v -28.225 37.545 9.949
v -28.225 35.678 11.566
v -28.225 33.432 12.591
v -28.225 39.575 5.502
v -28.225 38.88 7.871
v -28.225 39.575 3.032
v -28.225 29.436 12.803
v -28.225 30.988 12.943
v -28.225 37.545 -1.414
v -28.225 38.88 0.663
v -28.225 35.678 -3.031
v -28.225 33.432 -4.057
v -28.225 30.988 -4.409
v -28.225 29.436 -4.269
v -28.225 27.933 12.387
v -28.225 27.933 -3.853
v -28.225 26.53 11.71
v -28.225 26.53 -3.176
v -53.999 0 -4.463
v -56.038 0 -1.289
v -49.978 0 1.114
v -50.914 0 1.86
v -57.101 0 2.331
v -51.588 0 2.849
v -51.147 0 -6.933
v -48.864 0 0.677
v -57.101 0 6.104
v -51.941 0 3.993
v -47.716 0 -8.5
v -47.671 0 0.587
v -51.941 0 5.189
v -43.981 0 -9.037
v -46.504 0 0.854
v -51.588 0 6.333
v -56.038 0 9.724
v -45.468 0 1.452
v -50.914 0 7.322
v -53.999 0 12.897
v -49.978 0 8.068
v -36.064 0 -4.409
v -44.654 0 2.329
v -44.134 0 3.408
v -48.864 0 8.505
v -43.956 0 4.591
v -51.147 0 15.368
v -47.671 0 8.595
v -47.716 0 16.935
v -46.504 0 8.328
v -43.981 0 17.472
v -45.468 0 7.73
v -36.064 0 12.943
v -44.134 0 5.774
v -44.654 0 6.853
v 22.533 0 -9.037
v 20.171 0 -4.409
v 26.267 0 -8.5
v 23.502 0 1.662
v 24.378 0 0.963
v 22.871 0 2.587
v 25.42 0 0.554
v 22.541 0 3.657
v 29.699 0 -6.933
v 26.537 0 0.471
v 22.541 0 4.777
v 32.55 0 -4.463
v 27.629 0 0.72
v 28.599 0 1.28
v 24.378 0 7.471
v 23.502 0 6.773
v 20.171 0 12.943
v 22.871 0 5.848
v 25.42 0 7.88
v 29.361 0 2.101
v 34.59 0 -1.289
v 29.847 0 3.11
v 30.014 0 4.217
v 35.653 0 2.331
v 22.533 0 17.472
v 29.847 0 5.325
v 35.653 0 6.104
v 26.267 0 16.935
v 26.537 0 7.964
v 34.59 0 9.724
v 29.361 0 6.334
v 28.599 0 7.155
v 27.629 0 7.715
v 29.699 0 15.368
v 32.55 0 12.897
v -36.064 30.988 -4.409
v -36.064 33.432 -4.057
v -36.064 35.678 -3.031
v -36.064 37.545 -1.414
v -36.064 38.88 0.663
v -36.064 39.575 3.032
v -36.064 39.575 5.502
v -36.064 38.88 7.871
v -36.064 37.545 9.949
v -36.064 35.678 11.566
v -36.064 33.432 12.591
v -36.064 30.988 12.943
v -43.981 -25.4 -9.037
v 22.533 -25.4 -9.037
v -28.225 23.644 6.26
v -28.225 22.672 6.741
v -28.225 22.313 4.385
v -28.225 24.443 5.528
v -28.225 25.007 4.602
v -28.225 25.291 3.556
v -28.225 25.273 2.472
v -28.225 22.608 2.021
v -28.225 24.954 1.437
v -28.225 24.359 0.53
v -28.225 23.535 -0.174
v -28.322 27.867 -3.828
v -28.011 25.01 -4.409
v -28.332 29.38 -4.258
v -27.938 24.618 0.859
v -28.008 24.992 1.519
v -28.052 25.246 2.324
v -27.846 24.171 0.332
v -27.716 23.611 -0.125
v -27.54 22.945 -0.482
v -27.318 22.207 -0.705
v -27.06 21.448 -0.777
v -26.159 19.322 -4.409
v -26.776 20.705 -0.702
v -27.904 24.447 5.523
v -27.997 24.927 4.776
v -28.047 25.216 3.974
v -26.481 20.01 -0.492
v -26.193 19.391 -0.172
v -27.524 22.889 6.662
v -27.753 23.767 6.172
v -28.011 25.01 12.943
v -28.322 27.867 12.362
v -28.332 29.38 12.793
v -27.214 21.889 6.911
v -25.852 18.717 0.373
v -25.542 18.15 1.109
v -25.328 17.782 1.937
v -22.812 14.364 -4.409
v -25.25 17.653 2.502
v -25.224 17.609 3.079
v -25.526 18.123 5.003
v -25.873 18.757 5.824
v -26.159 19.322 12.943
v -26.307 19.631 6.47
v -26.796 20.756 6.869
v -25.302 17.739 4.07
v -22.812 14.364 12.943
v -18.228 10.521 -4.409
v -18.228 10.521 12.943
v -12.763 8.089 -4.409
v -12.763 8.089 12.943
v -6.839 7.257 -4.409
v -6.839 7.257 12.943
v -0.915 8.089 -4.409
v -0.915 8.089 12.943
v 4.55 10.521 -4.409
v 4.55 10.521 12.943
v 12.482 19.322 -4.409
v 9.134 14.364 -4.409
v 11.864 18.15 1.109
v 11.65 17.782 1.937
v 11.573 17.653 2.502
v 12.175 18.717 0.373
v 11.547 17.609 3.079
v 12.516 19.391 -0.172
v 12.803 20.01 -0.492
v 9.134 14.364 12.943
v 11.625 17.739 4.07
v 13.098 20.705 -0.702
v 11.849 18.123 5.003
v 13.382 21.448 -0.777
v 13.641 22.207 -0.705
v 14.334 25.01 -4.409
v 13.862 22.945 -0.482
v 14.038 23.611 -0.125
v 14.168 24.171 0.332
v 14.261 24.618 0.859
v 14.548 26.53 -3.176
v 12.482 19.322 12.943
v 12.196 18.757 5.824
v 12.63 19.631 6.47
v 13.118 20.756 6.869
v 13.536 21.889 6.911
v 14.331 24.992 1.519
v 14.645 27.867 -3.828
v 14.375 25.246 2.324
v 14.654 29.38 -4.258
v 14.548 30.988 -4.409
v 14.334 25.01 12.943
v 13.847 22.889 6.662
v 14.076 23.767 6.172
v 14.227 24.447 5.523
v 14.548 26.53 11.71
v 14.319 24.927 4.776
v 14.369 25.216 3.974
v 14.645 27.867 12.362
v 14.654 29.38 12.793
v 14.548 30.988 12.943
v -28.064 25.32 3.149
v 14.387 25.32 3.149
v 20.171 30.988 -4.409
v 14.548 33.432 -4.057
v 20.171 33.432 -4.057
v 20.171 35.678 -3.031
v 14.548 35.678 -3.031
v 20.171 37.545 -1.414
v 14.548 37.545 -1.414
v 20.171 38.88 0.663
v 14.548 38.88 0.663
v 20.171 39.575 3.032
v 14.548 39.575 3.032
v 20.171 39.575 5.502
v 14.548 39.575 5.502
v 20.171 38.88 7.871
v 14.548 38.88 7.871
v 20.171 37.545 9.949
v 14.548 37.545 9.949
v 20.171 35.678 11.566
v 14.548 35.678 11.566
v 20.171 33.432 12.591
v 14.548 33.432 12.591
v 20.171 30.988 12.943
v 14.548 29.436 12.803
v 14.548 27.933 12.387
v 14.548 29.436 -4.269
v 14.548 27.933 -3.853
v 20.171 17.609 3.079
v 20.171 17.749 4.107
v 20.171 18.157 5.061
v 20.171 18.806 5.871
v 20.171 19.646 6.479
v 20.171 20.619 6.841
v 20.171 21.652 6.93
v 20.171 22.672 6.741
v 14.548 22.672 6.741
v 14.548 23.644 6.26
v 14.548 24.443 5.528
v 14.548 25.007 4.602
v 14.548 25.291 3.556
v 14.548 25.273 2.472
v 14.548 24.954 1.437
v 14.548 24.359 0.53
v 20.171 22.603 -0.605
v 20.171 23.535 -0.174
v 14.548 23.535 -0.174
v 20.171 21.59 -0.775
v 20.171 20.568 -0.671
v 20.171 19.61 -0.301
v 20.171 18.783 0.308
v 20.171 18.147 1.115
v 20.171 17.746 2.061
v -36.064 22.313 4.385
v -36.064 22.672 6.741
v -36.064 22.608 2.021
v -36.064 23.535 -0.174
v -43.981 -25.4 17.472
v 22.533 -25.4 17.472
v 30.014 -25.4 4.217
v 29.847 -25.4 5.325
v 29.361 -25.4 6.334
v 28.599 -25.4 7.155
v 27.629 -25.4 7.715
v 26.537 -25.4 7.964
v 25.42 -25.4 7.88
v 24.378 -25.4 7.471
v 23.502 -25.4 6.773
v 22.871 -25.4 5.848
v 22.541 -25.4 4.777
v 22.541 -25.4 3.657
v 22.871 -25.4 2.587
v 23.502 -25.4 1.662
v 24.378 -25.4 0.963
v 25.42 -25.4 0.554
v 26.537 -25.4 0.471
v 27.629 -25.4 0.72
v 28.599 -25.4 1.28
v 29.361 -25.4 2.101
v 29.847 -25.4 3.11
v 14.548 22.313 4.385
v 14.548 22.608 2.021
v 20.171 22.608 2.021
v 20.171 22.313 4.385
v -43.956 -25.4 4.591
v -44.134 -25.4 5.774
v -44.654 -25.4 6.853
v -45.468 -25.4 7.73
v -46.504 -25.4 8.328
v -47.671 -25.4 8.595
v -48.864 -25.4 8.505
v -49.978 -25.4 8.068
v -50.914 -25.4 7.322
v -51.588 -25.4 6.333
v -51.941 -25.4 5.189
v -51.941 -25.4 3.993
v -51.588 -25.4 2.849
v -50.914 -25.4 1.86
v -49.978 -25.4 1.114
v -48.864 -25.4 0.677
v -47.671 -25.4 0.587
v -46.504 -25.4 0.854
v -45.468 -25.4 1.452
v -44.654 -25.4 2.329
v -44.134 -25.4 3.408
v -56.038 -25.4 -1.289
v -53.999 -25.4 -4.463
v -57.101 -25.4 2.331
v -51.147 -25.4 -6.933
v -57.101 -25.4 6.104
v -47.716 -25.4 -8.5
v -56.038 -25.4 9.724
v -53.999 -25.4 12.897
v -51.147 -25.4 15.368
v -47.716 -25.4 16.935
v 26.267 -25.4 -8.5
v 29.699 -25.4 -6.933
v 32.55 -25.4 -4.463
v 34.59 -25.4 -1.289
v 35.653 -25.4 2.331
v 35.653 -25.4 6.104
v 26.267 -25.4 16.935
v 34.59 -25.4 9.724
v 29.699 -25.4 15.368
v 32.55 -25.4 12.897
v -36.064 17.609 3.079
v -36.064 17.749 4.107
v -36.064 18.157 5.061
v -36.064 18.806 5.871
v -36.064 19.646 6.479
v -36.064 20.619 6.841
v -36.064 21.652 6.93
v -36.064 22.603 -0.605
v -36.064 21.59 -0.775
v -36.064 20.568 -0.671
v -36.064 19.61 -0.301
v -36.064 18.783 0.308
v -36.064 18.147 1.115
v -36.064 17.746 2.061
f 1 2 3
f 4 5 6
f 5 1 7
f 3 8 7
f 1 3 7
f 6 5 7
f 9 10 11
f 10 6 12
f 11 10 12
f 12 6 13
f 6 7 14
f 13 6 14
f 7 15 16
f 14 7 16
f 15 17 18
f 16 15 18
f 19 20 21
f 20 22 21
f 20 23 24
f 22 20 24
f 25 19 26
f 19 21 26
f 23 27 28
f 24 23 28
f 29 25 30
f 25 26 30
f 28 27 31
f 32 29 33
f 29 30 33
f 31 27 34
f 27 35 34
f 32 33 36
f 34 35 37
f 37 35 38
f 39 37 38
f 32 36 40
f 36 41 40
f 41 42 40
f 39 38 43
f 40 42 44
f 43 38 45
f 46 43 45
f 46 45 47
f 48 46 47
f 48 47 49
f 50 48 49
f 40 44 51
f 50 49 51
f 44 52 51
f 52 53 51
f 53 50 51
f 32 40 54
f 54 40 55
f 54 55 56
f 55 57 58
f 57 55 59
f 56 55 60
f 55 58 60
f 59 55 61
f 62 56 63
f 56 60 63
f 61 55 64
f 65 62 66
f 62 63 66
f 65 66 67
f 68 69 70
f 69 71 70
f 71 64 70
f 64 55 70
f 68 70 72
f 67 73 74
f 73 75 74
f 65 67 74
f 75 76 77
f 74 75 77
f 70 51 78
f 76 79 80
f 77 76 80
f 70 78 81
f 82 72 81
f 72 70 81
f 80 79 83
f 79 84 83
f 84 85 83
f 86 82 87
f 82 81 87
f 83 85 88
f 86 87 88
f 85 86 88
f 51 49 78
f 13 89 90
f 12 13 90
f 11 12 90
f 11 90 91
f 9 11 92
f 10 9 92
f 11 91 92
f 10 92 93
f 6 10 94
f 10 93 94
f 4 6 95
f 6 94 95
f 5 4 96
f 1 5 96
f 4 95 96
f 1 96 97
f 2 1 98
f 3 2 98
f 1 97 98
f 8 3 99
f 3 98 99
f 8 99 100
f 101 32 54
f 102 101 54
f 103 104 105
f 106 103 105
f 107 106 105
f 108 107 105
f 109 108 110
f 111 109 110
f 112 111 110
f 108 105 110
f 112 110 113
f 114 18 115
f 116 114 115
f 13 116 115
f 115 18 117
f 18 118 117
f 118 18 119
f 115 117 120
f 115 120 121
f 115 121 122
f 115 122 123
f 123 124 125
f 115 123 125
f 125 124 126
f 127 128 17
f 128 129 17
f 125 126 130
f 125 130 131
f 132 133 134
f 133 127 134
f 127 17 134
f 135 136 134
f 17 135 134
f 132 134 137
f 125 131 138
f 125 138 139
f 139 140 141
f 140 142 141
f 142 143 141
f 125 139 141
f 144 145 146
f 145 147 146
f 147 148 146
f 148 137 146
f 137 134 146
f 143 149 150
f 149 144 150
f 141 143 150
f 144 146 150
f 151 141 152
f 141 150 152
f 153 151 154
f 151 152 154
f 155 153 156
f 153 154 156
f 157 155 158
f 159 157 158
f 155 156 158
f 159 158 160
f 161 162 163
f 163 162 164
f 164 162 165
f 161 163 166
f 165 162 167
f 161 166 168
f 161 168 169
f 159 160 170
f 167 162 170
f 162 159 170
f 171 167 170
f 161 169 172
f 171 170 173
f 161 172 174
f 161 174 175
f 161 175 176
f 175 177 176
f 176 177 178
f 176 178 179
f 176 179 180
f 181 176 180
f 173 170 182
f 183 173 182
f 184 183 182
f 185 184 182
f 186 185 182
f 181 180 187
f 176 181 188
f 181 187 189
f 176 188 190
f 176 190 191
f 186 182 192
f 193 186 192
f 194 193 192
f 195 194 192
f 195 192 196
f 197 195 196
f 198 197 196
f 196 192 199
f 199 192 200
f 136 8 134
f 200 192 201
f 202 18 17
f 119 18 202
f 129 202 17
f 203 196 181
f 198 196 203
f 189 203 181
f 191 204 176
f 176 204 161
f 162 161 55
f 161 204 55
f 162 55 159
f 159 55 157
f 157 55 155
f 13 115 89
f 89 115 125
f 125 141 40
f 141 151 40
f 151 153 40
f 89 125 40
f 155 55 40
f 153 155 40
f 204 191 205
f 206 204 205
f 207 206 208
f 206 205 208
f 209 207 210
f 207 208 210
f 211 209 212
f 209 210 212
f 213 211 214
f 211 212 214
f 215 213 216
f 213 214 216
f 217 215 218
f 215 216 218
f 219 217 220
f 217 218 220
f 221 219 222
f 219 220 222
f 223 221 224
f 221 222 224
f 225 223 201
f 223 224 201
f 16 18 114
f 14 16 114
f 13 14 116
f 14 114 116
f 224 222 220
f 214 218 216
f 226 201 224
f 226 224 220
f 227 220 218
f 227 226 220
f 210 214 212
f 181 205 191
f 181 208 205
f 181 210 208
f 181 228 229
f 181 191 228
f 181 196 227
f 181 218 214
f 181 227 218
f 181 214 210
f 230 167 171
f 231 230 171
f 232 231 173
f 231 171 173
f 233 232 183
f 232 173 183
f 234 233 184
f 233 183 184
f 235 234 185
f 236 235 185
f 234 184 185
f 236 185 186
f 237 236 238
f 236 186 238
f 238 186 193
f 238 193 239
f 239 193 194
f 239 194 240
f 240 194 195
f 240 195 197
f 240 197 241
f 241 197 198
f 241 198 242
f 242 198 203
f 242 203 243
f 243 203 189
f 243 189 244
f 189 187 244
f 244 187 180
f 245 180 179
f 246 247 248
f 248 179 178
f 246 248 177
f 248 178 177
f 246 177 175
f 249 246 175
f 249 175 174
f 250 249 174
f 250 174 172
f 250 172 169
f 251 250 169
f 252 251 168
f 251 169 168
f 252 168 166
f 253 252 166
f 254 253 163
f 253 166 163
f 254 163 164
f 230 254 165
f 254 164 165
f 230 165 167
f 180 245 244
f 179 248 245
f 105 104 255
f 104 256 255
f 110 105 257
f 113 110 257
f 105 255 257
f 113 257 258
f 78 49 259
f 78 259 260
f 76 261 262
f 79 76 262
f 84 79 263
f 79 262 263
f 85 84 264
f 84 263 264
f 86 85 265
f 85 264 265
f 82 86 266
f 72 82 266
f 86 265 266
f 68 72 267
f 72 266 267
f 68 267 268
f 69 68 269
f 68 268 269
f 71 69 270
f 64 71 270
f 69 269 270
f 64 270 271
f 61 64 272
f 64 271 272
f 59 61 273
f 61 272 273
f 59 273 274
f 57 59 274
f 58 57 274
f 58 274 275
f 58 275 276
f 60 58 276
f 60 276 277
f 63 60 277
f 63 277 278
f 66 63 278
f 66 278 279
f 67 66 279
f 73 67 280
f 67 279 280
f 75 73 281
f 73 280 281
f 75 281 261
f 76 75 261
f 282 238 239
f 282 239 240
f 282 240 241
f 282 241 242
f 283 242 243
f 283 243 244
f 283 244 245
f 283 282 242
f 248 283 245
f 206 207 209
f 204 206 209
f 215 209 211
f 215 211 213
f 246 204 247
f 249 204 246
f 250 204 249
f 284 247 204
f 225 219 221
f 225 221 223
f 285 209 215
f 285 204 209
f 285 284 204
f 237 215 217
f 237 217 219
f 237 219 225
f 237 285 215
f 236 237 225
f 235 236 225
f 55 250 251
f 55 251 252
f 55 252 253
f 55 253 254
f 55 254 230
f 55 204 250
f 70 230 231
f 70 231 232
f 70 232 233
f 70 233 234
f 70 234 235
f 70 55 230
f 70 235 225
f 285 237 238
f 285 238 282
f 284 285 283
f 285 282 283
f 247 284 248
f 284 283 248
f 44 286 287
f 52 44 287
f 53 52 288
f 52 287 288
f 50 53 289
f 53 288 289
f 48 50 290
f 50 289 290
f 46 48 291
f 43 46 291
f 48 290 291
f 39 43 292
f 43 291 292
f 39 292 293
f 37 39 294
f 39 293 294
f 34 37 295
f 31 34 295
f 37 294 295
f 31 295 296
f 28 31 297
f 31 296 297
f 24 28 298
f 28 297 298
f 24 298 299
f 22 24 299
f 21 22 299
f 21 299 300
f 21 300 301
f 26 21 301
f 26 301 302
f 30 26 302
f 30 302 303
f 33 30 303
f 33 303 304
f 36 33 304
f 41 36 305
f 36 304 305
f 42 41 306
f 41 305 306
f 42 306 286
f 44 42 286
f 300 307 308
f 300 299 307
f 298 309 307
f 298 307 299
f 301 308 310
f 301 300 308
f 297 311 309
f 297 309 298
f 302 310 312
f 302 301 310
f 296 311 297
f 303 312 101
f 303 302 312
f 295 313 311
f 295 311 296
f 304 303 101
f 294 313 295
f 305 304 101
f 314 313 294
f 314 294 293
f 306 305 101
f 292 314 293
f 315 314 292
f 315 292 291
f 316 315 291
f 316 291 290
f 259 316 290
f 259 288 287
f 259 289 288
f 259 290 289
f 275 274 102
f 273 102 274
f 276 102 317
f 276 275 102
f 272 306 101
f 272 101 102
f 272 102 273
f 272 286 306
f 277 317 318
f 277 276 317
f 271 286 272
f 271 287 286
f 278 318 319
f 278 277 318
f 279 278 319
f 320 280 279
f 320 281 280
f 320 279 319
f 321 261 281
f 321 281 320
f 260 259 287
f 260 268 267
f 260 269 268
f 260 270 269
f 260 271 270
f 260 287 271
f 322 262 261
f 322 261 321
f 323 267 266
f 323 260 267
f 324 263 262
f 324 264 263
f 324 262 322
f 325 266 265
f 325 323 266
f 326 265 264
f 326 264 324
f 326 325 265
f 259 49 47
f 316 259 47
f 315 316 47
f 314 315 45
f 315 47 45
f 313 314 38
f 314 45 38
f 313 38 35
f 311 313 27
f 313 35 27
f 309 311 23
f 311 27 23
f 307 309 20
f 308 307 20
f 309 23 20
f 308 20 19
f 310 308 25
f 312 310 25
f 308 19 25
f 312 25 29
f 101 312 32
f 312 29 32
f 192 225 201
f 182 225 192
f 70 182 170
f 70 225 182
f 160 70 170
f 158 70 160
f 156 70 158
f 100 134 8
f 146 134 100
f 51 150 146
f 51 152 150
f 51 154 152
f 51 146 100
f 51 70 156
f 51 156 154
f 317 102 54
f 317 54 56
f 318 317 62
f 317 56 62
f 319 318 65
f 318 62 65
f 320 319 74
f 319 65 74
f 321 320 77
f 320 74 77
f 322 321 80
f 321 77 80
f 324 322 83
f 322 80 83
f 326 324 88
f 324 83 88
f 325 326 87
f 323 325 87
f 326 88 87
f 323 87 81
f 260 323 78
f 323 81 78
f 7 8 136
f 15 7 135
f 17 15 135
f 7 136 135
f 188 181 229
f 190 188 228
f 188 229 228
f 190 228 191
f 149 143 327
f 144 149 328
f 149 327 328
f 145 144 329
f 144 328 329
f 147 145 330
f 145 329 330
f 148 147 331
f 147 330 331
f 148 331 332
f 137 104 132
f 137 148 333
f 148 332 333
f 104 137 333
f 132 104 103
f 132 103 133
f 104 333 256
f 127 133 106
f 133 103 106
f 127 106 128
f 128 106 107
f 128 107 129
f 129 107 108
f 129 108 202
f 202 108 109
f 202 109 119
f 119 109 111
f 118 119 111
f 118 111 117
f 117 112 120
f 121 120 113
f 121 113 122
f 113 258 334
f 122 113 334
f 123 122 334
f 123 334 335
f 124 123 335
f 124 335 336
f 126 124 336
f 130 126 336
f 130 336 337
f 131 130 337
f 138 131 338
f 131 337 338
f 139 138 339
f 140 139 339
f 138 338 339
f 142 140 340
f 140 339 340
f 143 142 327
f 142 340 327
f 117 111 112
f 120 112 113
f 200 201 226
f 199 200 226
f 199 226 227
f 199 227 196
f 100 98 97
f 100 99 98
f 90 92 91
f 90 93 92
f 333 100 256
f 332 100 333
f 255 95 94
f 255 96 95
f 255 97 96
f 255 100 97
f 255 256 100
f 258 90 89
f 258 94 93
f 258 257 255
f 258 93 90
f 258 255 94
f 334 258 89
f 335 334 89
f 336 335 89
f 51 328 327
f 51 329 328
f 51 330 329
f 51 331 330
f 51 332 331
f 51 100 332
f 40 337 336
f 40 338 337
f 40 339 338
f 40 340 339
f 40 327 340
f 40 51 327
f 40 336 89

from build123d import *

# Parameters (mm, degrees)
F0_W     = 66.5143355727
F0_H     = 26.5093380585
F1_DEPTH = 25.4
F2_R     = 4.014844692
F2_R_2   = 3.7572922796
F3_DEPTH = 25.4
F4_W     = 56.2347974628
F4_H     = 17.3515677452
F5_DEPTH = 30.988
F7_DEPTH = 32.512
F8_R     = 3.8559043701
F9_DEPTH = 79.502
F10_W    = 7.8387893736
F10_H    = 8.6757838726
F11_W    = 5.6234812364
F11_H    = 8.6757838726


with BuildPart() as f1:
    # F0 (on Front) → F1 (new body)
    with BuildSketch(Plane.XZ):
        with BuildLine():
            ThreePointArc((22.5329361856, -9.037273936), (35.7876052149, 4.2173950933), (22.5329361856, 17.4720641226))
            Line((22.5329361856, 17.4720641226), (22.5329361856, -9.037273936))
        make_face()
        with BuildLine():
            Line((-43.9813993871, -9.037273936), (-43.9813993871, 17.4720641226))
            ThreePointArc((-43.9813993871, 17.4720641226), (-57.2360684164, 4.2173950933), (-43.9813993871, -9.037273936))
        make_face()
        with Locations((-10.7242316008, 4.2173950933)):
            Rectangle(F0_W, F0_H)
    extrude(amount=F1_DEPTH)

    # F2 (on face) → F3 (cut)
    with BuildSketch(Plane.XZ.offset(25.4)):
        with Locations((-47.9707419872, 4.5908982866)):
            Circle(F2_R)
        with Locations((26.2565240264, 4.2173950933)):
            Circle(F2_R_2)
    extrude(amount=-F3_DEPTH, mode=Mode.SUBTRACT)

    # F4 (on face) → F5 (join)
    with BuildSketch(Plane(origin=(0, 0, 0), x_dir=(-1, 0, 0), z_dir=(0, 1, 0))):
        with Locations((7.9463692382, 4.2671263218)):
            Rectangle(F4_W, F4_H)
    extrude(amount=F5_DEPTH)

    # F6 (on face) → F7 (cut)
    with BuildSketch(Plane.XY.offset(12.9429101944)):
        with BuildLine():
            Line((14.5475482568, 30.988), (-28.224978596, 30.988))
            ThreePointArc((-28.224978596, 30.988), (-6.8387151696, 7.2567955588), (14.5475482568, 30.988))
        make_face()
    extrude(amount=-F7_DEPTH, mode=Mode.SUBTRACT)

    # F8 (on face) → F9 (cut)
    with BuildSketch(Plane(origin=(-36.0637679696, 0, 0), x_dir=(0, -1, 0), z_dir=(-1, 0, 0))):
        with Locations((-21.4650537819, 3.0787487049)):
            Circle(F8_R)
    extrude(amount=-F9_DEPTH, mode=Mode.SUBTRACT)

    # F10 (on face) → F12 (revolve)
    with BuildSketch(Plane(origin=(0, 30.988, 0), x_dir=(-1, 0, 0), z_dir=(0, 1, 0))):
        with Locations((32.1443732828, 8.6050182581)):
            Rectangle(F10_W, F10_H)
    revolve(axis=Axis((-32.1443732828, 30.988, 4.2671263218), (1, 0, 0)))

    # F11 (on face) → F13 (revolve)
    with BuildSketch(Plane(origin=(0, 30.988, 0), x_dir=(-1, 0, 0), z_dir=(0, 1, 0))):
        with Locations((-17.359288875, 8.6050182581)):
            Rectangle(F11_W, F11_H)
    revolve(axis=Axis((17.359288875, 30.988, 4.2671263218), (1, 0, 0)))


solid = f1.part
